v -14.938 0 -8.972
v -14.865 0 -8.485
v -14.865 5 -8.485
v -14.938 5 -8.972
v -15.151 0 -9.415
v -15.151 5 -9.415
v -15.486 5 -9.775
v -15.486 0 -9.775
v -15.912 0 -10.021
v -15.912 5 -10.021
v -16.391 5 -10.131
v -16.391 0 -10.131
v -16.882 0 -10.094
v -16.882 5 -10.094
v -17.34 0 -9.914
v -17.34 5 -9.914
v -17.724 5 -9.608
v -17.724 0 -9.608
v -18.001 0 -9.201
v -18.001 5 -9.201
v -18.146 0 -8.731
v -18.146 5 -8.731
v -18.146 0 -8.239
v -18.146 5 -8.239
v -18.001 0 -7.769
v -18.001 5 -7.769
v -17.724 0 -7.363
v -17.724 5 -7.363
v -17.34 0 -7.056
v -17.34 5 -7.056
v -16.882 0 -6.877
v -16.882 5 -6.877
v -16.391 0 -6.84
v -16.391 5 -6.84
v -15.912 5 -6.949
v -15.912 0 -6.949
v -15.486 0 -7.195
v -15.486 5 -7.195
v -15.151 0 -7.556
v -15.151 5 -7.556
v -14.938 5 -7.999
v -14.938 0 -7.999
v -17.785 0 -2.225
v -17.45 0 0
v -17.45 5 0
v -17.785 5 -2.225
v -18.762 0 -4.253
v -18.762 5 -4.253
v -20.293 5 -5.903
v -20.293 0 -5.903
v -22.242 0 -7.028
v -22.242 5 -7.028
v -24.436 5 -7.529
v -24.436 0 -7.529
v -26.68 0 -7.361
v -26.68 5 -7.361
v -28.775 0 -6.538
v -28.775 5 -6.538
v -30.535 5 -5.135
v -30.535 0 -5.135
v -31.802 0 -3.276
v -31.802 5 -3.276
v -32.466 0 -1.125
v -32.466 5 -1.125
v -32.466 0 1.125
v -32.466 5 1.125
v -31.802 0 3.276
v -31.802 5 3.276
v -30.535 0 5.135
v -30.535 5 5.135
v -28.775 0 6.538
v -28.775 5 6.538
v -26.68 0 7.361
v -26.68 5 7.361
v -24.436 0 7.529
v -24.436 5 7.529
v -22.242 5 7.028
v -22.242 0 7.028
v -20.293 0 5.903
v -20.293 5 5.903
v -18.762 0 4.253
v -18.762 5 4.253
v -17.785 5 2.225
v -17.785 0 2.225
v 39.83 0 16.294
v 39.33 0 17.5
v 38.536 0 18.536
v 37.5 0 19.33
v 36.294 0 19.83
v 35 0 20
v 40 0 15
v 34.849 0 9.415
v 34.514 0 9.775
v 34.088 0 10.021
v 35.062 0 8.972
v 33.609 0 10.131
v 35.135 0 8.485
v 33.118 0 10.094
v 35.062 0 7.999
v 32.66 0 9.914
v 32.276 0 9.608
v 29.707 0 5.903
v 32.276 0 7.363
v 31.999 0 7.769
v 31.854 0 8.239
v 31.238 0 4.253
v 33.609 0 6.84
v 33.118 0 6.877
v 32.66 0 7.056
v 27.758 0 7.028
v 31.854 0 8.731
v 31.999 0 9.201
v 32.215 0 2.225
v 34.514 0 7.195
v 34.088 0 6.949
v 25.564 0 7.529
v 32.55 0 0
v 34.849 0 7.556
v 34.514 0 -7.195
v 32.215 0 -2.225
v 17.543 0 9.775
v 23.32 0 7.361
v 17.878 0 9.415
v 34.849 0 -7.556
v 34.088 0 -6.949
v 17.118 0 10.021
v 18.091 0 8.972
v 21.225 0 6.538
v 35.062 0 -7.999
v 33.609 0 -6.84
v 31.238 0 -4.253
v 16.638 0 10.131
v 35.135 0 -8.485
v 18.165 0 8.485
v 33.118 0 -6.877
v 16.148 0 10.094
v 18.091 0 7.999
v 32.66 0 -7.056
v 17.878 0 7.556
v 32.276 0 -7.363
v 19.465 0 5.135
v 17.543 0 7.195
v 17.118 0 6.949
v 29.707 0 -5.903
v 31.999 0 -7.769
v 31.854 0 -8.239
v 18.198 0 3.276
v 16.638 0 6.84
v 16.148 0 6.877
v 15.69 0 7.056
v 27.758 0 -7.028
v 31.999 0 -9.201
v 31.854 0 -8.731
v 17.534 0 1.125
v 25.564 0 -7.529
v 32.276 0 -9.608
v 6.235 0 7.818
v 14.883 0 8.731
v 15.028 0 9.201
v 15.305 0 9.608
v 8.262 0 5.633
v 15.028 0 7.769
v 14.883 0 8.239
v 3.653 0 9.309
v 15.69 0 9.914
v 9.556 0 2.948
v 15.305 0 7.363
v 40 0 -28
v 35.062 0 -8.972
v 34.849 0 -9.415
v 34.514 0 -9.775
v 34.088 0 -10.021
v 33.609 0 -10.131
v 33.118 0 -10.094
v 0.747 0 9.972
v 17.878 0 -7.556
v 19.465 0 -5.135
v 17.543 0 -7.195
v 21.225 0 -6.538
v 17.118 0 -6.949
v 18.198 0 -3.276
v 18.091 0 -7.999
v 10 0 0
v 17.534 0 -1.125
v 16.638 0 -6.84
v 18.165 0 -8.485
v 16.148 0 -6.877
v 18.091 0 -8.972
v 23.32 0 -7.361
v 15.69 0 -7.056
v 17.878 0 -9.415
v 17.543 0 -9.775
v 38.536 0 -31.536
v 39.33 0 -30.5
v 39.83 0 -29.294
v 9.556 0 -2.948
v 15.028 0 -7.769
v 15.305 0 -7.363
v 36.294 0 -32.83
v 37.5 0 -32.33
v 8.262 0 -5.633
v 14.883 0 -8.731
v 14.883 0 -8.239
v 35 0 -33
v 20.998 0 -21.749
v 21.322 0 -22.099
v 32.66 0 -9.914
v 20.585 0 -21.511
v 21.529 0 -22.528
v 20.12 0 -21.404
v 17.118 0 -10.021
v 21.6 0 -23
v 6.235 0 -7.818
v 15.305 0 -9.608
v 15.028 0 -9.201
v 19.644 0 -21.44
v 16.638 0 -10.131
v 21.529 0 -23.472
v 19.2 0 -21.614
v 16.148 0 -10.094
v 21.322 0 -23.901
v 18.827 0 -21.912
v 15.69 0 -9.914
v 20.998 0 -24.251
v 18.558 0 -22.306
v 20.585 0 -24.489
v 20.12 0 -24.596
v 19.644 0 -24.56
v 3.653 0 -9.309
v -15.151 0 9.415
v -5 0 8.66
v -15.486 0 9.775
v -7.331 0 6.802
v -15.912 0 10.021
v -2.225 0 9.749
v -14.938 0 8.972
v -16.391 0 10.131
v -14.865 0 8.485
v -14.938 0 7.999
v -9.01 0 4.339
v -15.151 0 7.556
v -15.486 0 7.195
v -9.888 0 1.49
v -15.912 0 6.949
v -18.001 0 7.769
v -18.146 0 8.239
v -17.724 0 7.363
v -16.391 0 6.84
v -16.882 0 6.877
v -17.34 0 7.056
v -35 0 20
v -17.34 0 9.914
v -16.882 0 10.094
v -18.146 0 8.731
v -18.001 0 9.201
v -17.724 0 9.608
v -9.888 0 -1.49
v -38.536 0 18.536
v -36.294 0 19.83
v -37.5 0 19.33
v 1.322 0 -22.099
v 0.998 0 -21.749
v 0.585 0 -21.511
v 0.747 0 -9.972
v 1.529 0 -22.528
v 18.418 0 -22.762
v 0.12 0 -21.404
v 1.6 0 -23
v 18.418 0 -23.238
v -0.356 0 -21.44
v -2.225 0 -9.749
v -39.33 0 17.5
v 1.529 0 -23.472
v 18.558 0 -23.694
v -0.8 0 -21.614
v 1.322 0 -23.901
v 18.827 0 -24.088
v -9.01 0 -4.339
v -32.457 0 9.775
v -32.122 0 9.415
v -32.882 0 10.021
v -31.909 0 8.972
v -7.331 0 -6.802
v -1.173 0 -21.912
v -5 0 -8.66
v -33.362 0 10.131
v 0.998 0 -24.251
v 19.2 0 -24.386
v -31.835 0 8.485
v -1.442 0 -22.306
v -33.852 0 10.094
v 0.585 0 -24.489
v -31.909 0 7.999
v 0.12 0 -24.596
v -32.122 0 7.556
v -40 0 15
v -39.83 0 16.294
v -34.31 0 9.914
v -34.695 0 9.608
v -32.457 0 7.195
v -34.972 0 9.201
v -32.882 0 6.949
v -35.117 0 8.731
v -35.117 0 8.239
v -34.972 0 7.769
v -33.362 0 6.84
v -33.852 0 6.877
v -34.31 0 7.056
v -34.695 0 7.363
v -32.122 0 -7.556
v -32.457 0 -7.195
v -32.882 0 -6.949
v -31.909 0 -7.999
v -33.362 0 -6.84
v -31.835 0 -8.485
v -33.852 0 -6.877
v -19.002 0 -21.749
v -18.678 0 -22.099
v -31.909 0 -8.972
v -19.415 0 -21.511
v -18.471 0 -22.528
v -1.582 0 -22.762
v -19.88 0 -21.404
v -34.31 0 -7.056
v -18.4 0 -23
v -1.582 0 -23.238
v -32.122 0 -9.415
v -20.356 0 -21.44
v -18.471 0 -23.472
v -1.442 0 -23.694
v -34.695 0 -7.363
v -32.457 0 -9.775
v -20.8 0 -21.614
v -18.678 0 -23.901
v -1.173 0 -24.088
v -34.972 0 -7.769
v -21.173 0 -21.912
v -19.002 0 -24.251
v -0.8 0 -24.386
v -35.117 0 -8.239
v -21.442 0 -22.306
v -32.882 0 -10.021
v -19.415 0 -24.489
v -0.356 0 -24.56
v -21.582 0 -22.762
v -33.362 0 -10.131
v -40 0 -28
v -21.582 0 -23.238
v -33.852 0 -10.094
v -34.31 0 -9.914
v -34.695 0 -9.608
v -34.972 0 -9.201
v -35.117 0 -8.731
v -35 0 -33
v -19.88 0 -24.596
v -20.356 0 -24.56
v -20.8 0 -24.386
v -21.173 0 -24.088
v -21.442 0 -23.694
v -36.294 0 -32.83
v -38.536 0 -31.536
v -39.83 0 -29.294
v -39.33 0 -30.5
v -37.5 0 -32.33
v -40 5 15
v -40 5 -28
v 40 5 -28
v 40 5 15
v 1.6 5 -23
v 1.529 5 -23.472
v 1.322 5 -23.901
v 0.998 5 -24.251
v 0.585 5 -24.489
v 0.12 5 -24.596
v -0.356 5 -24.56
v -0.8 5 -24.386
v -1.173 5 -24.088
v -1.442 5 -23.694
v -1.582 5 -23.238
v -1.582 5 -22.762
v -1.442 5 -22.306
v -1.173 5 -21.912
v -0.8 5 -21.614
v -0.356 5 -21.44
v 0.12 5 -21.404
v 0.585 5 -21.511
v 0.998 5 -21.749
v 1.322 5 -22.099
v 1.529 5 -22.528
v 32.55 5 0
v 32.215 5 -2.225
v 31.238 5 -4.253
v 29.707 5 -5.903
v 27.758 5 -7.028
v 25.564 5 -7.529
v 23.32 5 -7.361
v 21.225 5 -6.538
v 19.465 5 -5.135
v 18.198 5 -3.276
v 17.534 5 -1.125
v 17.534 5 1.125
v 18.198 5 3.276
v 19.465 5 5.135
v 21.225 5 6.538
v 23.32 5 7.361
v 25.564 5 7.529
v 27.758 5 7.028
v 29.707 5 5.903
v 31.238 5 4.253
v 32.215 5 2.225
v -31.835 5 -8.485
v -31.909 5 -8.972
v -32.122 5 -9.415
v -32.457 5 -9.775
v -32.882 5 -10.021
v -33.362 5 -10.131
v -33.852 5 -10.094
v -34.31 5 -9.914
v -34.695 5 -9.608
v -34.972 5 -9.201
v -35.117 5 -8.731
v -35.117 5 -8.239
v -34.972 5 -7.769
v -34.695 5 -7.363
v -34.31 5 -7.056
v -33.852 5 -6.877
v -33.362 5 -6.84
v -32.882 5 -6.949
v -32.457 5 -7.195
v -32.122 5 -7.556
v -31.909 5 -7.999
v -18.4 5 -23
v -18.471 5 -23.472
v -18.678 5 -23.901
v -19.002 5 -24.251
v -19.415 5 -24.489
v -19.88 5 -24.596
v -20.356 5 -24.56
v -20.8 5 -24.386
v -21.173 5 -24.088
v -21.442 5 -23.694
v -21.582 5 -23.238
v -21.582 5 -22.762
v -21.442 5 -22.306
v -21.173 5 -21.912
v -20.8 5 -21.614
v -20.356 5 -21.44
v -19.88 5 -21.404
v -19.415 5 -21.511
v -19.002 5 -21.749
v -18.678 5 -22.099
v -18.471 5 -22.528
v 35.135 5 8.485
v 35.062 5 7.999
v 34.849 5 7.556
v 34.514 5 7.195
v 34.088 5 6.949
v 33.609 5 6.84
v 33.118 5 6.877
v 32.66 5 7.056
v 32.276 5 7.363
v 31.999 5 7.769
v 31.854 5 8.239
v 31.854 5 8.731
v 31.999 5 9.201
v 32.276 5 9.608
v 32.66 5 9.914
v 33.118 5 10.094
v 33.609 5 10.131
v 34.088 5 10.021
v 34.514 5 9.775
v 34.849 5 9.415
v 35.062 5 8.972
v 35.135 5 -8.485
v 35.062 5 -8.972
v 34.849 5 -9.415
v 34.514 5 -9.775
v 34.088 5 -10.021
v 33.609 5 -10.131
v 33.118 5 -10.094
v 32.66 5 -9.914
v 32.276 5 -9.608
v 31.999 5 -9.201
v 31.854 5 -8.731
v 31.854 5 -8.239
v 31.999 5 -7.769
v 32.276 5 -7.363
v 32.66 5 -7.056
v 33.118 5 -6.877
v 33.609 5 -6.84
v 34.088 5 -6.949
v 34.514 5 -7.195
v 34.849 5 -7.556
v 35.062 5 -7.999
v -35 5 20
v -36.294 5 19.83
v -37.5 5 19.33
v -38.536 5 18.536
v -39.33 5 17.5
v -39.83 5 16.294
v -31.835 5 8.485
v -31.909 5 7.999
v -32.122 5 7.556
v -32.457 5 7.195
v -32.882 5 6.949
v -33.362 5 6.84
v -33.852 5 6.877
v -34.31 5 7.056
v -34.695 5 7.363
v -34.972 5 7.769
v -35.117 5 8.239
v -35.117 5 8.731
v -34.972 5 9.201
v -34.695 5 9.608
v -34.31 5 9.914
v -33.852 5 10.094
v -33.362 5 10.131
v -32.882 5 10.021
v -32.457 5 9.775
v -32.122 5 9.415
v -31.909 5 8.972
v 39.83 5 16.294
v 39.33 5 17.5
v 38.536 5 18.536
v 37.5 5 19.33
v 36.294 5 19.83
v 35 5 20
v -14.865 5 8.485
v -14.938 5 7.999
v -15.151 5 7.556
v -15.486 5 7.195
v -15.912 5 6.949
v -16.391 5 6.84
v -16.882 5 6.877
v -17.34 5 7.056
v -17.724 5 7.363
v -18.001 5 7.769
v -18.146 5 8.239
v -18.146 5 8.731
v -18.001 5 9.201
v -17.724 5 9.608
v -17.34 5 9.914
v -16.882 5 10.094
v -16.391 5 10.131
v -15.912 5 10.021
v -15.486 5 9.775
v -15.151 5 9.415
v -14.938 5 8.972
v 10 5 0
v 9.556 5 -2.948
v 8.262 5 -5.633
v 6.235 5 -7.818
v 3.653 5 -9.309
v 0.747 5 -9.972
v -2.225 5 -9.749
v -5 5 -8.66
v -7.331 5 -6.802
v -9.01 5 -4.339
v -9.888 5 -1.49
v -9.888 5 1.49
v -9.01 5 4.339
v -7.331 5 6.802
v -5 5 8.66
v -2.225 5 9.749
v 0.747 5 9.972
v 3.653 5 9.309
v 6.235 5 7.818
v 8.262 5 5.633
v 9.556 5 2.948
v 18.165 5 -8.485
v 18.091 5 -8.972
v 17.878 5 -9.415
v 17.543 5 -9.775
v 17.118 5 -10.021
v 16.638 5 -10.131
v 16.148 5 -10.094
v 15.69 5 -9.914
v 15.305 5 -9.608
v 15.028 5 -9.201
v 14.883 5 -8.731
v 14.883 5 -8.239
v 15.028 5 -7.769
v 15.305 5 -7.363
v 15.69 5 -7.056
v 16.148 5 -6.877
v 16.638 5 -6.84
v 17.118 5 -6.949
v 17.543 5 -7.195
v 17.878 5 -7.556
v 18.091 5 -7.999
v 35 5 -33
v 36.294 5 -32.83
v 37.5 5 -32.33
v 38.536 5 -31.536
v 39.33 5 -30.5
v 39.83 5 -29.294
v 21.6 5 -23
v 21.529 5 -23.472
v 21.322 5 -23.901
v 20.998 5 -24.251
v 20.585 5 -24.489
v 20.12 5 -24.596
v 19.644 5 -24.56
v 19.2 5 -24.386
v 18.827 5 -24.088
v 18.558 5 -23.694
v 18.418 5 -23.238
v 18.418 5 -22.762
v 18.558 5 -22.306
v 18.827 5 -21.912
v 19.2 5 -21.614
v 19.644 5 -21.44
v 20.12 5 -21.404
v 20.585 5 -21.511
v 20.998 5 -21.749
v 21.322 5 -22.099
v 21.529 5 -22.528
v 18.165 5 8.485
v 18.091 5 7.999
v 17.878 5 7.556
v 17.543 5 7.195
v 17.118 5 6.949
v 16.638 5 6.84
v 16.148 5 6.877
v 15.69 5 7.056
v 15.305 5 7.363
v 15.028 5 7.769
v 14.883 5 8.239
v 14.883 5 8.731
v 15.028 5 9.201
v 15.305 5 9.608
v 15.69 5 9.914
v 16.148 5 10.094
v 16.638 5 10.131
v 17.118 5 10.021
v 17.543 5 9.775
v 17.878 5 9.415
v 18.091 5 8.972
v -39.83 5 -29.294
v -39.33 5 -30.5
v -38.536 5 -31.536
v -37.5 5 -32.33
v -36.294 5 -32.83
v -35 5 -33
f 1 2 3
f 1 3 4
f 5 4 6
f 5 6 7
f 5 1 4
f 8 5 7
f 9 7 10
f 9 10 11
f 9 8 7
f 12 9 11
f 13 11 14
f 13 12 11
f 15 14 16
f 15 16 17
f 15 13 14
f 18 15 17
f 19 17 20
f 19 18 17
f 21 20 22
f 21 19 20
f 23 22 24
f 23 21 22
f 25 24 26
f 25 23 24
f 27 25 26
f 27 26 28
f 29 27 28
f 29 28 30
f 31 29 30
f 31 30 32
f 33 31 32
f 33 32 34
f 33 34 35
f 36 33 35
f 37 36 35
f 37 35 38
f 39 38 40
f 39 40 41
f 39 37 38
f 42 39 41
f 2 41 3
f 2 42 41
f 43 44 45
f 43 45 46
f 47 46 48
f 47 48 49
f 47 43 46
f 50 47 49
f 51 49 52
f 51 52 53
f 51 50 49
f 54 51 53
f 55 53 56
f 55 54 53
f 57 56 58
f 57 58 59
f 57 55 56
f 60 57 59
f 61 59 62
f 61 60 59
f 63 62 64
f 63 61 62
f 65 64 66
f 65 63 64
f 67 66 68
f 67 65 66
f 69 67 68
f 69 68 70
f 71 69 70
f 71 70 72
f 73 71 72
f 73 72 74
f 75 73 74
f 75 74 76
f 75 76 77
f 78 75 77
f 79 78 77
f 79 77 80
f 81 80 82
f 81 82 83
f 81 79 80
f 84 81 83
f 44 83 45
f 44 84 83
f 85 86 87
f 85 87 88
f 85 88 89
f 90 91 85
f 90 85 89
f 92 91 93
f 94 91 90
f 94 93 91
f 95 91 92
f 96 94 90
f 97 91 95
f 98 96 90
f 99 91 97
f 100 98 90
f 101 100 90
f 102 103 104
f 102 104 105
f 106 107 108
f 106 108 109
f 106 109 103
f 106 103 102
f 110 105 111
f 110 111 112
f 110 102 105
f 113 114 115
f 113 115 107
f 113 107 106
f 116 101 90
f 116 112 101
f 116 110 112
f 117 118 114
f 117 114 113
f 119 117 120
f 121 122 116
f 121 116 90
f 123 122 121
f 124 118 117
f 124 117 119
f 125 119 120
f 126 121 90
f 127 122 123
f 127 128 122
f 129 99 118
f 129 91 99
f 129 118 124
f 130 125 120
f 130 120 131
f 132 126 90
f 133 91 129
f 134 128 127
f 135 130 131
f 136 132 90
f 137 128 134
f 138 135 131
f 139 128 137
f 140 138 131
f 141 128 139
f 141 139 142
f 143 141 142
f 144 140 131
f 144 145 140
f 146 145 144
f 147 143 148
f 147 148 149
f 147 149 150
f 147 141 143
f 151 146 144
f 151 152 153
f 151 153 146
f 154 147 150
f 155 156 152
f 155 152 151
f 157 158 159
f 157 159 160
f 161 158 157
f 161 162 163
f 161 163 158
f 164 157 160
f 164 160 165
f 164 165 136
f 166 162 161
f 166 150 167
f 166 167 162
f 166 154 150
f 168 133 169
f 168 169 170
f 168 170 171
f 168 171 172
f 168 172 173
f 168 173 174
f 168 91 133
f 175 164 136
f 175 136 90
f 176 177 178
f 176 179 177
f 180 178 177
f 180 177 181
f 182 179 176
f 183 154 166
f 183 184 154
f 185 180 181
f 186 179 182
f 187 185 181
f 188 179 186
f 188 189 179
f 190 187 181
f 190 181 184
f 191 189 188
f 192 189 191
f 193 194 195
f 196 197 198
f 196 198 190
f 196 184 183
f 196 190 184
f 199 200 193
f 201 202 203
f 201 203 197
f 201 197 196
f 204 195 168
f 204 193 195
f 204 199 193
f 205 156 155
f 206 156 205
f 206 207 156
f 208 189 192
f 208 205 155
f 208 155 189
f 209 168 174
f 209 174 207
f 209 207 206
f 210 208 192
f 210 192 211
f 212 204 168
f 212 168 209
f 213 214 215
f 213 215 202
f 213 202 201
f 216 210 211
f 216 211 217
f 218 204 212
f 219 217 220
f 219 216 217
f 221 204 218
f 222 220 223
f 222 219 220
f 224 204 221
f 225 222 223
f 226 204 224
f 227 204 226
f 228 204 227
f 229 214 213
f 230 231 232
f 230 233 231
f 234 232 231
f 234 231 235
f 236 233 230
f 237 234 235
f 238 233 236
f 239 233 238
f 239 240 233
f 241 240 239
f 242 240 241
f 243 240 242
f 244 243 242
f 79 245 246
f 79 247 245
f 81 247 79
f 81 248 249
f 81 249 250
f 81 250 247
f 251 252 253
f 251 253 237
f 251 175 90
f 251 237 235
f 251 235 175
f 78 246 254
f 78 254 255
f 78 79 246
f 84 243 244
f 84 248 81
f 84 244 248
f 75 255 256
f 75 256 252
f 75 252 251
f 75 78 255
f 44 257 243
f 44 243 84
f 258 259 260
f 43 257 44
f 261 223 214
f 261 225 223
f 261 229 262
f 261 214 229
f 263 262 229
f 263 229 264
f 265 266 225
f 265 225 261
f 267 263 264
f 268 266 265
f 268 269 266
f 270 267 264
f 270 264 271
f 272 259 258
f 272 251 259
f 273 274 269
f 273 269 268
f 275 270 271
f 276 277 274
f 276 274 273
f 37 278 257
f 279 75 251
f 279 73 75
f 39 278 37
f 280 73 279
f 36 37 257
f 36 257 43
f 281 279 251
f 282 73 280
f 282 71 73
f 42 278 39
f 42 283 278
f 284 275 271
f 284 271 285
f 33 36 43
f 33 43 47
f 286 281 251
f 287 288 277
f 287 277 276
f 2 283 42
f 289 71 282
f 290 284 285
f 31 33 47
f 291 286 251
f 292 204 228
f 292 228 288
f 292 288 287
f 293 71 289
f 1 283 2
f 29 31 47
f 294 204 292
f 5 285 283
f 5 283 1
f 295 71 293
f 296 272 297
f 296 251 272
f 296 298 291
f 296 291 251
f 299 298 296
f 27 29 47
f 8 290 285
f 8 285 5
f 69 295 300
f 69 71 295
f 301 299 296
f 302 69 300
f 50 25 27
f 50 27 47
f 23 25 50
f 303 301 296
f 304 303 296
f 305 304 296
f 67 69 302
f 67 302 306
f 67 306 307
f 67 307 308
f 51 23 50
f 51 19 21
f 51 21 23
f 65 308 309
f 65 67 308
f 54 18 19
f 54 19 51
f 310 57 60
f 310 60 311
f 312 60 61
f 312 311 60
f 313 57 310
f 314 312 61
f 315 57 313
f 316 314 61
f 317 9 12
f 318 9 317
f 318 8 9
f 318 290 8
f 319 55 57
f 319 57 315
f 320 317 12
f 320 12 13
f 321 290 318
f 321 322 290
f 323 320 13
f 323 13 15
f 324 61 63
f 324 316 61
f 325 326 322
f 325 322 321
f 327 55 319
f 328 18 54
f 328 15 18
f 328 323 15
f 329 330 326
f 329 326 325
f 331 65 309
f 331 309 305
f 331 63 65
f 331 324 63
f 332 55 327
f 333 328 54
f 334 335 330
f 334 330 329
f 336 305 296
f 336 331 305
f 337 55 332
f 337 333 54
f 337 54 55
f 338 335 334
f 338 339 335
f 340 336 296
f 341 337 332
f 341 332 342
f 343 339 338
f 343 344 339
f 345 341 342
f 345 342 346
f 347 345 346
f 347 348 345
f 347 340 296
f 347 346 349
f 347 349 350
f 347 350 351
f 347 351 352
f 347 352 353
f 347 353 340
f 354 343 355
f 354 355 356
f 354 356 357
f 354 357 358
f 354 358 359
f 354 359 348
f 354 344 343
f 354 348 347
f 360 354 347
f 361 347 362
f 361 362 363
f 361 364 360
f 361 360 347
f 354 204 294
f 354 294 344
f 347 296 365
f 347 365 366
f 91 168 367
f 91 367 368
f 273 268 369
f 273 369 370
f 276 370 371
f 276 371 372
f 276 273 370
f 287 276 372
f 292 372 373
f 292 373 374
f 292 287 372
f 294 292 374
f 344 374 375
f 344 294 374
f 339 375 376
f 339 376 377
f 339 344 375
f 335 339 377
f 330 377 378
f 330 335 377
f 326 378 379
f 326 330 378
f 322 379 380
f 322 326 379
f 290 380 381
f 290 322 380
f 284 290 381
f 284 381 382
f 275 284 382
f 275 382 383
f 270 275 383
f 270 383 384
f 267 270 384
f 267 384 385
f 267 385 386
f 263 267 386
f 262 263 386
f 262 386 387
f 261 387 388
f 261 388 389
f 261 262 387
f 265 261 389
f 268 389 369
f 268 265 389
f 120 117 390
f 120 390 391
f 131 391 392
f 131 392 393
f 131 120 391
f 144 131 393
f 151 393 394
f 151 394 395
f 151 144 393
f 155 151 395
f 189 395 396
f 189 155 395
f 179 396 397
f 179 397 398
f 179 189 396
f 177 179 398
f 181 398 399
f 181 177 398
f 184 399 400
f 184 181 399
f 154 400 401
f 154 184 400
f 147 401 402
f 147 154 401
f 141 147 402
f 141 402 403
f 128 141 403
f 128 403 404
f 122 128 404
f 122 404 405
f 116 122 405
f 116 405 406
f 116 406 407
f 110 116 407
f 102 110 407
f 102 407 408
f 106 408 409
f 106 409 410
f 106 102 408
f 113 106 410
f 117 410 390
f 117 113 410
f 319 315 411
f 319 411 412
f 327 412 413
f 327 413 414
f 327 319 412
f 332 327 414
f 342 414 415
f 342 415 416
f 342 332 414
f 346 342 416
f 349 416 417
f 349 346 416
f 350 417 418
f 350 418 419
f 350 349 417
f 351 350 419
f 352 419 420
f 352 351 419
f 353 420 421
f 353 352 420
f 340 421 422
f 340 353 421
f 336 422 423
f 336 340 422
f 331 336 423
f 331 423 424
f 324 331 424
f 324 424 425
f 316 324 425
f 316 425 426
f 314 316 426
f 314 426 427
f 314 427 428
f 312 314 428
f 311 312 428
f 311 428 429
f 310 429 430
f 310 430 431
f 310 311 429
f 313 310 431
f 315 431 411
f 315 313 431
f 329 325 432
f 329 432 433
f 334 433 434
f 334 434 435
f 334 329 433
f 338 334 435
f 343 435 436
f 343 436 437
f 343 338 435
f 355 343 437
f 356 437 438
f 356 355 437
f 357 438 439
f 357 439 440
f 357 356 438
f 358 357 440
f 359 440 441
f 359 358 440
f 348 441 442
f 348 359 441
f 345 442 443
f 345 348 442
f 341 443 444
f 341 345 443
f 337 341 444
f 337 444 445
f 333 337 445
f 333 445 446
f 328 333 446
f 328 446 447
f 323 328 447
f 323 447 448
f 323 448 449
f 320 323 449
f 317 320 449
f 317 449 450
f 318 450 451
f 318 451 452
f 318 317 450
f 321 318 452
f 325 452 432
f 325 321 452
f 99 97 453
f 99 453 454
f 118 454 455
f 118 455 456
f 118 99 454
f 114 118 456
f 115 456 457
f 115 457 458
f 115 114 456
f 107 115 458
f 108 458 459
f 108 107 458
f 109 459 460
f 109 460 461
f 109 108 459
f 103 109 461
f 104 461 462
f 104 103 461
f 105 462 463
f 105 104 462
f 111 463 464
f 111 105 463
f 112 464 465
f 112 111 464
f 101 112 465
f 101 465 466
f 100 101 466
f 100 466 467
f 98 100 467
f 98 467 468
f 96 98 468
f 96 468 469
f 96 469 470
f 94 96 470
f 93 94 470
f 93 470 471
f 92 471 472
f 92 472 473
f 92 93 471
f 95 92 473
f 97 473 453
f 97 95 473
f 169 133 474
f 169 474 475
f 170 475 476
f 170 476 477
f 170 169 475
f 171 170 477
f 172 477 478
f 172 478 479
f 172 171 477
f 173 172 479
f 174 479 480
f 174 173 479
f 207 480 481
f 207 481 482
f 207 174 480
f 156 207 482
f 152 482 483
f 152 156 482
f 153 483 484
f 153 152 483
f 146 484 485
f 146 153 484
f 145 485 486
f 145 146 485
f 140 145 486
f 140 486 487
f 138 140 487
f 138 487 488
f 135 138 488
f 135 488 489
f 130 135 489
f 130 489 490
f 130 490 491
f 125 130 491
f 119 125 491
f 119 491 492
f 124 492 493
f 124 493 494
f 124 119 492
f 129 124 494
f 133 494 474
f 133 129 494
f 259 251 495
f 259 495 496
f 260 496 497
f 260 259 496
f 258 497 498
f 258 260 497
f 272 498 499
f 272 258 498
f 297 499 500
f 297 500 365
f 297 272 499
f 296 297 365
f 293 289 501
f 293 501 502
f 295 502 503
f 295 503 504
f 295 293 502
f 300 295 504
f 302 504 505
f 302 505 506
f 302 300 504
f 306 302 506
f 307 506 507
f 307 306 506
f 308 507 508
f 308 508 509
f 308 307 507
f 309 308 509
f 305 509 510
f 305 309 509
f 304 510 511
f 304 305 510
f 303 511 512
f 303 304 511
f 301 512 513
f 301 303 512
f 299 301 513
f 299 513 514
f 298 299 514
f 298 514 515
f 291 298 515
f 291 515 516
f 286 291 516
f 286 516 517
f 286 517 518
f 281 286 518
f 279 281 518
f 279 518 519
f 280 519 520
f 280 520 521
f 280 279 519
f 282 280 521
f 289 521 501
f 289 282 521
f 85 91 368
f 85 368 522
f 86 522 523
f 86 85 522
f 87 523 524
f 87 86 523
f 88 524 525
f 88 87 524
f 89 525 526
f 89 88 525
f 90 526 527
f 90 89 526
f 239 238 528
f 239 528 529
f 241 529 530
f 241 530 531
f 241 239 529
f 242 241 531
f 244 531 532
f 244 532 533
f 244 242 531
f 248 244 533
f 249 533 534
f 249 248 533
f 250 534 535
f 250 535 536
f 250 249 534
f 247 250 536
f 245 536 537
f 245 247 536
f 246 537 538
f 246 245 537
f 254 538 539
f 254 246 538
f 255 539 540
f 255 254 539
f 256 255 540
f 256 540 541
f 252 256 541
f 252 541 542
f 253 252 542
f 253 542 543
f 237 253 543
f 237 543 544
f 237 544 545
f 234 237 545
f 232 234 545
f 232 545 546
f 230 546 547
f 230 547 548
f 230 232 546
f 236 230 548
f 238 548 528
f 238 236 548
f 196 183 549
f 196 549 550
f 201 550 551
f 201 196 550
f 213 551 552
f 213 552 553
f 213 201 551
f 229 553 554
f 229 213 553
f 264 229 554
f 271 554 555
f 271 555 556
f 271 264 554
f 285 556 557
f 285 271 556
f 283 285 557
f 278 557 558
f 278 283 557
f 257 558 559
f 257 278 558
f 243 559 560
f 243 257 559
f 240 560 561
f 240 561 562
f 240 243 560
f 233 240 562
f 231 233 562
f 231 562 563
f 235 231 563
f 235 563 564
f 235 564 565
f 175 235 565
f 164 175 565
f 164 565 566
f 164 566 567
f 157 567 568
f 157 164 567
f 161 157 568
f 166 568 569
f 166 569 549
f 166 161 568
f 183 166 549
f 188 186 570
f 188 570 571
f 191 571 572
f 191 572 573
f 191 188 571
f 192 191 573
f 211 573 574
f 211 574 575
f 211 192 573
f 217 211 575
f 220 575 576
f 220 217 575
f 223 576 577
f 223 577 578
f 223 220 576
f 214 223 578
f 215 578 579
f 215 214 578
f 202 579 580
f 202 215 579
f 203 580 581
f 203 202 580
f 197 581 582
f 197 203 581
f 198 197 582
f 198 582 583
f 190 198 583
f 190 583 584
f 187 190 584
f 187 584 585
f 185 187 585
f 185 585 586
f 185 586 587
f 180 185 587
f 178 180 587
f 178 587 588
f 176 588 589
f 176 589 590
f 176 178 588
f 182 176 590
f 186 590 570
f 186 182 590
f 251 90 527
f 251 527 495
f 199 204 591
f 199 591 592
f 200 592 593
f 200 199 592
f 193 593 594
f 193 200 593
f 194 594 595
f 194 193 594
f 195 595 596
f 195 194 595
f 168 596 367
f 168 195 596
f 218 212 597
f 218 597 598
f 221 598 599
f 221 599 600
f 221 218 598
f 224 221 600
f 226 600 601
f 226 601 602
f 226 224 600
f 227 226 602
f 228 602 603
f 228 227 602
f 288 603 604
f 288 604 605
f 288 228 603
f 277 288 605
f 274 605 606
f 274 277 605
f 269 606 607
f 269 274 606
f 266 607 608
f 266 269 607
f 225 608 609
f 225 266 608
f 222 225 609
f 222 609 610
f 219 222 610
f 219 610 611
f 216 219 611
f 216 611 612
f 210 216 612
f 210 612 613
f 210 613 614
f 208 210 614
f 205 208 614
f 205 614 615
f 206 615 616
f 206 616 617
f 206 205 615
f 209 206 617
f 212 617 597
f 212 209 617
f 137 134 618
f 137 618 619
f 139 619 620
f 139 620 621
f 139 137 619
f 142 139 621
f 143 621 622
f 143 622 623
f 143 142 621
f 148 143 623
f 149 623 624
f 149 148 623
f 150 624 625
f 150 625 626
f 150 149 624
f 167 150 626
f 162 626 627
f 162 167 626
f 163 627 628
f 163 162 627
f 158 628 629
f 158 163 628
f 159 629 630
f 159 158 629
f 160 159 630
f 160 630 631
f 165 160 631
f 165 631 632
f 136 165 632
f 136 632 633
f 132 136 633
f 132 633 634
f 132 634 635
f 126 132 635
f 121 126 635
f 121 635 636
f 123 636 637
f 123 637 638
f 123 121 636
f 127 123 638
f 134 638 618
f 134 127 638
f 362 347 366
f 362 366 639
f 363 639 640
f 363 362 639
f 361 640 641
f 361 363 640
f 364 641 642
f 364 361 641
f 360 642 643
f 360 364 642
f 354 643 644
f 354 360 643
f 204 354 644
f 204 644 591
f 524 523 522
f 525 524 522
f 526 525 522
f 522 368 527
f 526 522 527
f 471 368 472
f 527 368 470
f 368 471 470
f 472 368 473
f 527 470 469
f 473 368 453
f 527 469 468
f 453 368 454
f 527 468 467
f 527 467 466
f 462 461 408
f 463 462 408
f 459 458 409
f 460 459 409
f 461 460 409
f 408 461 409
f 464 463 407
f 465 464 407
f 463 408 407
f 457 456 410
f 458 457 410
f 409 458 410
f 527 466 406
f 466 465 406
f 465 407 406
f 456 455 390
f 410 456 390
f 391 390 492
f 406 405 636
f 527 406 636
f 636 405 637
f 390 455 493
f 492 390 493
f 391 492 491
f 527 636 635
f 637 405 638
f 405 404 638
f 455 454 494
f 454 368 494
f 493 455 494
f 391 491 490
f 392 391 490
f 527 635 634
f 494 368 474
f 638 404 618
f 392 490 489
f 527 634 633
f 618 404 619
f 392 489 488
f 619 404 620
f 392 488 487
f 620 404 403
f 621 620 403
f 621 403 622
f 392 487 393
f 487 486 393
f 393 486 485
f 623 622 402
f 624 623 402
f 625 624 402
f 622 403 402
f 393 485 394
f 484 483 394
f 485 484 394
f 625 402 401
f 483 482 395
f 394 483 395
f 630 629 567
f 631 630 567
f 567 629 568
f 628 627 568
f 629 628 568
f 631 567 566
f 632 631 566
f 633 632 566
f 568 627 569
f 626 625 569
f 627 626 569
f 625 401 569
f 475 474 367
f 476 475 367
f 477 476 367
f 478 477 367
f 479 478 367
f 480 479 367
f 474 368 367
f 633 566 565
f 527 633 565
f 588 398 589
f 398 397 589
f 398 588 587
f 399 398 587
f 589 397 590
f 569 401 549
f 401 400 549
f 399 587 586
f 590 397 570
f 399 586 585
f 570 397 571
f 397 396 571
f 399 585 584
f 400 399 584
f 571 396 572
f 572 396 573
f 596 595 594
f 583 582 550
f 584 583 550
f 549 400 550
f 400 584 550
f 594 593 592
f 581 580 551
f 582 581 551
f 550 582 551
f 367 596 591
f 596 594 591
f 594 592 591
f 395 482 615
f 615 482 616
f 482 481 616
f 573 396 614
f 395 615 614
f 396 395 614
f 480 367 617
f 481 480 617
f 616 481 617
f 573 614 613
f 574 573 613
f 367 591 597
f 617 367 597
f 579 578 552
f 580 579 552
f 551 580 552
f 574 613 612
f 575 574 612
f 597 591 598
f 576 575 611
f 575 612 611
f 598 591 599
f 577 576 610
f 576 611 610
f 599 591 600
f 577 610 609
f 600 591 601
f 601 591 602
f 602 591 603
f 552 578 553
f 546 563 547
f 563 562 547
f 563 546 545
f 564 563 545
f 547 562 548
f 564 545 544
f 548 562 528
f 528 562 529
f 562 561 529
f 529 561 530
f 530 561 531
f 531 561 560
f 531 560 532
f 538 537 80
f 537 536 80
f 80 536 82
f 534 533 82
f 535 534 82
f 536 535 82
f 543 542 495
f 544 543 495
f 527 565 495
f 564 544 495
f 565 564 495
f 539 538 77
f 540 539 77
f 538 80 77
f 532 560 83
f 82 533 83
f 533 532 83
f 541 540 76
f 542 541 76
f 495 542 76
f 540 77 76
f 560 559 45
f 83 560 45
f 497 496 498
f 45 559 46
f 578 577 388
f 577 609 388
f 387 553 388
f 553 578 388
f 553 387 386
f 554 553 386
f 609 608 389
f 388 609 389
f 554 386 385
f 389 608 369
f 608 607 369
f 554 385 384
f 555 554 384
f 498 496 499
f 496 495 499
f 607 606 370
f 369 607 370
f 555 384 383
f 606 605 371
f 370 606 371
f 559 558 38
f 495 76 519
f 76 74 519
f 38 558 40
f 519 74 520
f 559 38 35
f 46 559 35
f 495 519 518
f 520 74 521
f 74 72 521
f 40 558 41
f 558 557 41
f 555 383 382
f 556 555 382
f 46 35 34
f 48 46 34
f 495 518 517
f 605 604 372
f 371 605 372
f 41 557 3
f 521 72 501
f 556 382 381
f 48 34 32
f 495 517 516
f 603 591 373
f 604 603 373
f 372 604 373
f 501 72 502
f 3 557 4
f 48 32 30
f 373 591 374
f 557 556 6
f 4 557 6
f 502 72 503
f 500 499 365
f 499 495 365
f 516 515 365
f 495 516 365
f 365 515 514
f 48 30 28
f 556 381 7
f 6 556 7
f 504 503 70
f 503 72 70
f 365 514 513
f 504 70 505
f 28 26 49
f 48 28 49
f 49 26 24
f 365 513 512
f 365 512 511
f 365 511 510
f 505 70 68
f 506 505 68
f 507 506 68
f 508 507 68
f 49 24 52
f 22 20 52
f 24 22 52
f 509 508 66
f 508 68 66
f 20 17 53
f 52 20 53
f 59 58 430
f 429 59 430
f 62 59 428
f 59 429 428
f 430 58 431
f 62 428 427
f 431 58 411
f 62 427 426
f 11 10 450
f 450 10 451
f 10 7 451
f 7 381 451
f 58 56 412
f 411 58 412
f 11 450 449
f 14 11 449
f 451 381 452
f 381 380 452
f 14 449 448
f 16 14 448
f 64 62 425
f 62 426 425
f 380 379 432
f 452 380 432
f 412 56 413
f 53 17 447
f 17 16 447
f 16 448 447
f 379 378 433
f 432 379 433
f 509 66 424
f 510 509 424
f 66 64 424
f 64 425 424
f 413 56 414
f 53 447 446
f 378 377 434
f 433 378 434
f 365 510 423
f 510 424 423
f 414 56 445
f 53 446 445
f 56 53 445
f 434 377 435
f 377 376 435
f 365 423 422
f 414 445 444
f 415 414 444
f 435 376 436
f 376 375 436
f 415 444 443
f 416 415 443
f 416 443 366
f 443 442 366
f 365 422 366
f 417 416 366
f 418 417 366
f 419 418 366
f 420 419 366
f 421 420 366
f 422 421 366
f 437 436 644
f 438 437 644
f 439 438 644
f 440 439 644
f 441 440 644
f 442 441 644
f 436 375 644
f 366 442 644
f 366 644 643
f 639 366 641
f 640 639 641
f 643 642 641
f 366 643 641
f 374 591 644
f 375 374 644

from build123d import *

# Parameters (mm, degrees)
SKETCH_1_R      = 10
SKETCH_1_R_2    = 7.55
SKETCH_1_R_3    = 1.65
SKETCH_1_R_4    = 1.6
EXTRUDE_1_DEPTH = 5


with BuildPart() as part:
    # 草图1 → 凸台-拉伸1 (new body)
    with BuildSketch(Plane(origin=(0, 0, 0), x_dir=(1, 0, 0), z_dir=(0, 1, 0))):
        with BuildLine():
            Line((-35, 33), (35, 33))
            ThreePointArc((35, 33), (38.535533906, 31.535533906), (40, 28))
            Line((40, 28), (40, -15))
            ThreePointArc((40, -15), (38.535533906, -18.535533906), (35, -20))
            Line((35, -20), (-35, -20))
            ThreePointArc((-35, -20), (-38.535533906, -18.535533906), (-40, -15))
            Line((-40, -15), (-40, 28))
            ThreePointArc((-40, 28), (-38.535533906, 31.535533906), (-35, 33))
        make_face()
        Circle(SKETCH_1_R, mode=Mode.SUBTRACT)
        with Locations((-25, 0)):
            Circle(SKETCH_1_R_2, mode=Mode.SUBTRACT)
        with Locations((-33.485281374, 8.485281374)):
            Circle(SKETCH_1_R_3, mode=Mode.SUBTRACT)
        with Locations((-16.514718626, 8.485281374)):
            Circle(SKETCH_1_R_3, mode=Mode.SUBTRACT)
        with Locations((-16.514718626, -8.485281374)):
            Circle(SKETCH_1_R_3, mode=Mode.SUBTRACT)
        with Locations((-33.485281374, -8.485281374)):
            Circle(SKETCH_1_R_3, mode=Mode.SUBTRACT)
        with Locations((25, 0)):
            Circle(SKETCH_1_R_2, mode=Mode.SUBTRACT)
        with Locations((16.514718626, 8.485281374)):
            Circle(SKETCH_1_R_3, mode=Mode.SUBTRACT)
        with Locations((16.514718626, -8.485281374)):
            Circle(SKETCH_1_R_3, mode=Mode.SUBTRACT)
        with Locations((33.485281374, -8.485281374)):
            Circle(SKETCH_1_R_3, mode=Mode.SUBTRACT)
        with Locations((33.485281374, 8.485281374)):
            Circle(SKETCH_1_R_3, mode=Mode.SUBTRACT)
        with Locations((-20, 23)):
            Circle(SKETCH_1_R_4, mode=Mode.SUBTRACT)
        with Locations((0, 23)):
            Circle(SKETCH_1_R_4, mode=Mode.SUBTRACT)
        with Locations((20, 23)):
            Circle(SKETCH_1_R_4, mode=Mode.SUBTRACT)
    extrude(amount=EXTRUDE_1_DEPTH)


solid = part.part
